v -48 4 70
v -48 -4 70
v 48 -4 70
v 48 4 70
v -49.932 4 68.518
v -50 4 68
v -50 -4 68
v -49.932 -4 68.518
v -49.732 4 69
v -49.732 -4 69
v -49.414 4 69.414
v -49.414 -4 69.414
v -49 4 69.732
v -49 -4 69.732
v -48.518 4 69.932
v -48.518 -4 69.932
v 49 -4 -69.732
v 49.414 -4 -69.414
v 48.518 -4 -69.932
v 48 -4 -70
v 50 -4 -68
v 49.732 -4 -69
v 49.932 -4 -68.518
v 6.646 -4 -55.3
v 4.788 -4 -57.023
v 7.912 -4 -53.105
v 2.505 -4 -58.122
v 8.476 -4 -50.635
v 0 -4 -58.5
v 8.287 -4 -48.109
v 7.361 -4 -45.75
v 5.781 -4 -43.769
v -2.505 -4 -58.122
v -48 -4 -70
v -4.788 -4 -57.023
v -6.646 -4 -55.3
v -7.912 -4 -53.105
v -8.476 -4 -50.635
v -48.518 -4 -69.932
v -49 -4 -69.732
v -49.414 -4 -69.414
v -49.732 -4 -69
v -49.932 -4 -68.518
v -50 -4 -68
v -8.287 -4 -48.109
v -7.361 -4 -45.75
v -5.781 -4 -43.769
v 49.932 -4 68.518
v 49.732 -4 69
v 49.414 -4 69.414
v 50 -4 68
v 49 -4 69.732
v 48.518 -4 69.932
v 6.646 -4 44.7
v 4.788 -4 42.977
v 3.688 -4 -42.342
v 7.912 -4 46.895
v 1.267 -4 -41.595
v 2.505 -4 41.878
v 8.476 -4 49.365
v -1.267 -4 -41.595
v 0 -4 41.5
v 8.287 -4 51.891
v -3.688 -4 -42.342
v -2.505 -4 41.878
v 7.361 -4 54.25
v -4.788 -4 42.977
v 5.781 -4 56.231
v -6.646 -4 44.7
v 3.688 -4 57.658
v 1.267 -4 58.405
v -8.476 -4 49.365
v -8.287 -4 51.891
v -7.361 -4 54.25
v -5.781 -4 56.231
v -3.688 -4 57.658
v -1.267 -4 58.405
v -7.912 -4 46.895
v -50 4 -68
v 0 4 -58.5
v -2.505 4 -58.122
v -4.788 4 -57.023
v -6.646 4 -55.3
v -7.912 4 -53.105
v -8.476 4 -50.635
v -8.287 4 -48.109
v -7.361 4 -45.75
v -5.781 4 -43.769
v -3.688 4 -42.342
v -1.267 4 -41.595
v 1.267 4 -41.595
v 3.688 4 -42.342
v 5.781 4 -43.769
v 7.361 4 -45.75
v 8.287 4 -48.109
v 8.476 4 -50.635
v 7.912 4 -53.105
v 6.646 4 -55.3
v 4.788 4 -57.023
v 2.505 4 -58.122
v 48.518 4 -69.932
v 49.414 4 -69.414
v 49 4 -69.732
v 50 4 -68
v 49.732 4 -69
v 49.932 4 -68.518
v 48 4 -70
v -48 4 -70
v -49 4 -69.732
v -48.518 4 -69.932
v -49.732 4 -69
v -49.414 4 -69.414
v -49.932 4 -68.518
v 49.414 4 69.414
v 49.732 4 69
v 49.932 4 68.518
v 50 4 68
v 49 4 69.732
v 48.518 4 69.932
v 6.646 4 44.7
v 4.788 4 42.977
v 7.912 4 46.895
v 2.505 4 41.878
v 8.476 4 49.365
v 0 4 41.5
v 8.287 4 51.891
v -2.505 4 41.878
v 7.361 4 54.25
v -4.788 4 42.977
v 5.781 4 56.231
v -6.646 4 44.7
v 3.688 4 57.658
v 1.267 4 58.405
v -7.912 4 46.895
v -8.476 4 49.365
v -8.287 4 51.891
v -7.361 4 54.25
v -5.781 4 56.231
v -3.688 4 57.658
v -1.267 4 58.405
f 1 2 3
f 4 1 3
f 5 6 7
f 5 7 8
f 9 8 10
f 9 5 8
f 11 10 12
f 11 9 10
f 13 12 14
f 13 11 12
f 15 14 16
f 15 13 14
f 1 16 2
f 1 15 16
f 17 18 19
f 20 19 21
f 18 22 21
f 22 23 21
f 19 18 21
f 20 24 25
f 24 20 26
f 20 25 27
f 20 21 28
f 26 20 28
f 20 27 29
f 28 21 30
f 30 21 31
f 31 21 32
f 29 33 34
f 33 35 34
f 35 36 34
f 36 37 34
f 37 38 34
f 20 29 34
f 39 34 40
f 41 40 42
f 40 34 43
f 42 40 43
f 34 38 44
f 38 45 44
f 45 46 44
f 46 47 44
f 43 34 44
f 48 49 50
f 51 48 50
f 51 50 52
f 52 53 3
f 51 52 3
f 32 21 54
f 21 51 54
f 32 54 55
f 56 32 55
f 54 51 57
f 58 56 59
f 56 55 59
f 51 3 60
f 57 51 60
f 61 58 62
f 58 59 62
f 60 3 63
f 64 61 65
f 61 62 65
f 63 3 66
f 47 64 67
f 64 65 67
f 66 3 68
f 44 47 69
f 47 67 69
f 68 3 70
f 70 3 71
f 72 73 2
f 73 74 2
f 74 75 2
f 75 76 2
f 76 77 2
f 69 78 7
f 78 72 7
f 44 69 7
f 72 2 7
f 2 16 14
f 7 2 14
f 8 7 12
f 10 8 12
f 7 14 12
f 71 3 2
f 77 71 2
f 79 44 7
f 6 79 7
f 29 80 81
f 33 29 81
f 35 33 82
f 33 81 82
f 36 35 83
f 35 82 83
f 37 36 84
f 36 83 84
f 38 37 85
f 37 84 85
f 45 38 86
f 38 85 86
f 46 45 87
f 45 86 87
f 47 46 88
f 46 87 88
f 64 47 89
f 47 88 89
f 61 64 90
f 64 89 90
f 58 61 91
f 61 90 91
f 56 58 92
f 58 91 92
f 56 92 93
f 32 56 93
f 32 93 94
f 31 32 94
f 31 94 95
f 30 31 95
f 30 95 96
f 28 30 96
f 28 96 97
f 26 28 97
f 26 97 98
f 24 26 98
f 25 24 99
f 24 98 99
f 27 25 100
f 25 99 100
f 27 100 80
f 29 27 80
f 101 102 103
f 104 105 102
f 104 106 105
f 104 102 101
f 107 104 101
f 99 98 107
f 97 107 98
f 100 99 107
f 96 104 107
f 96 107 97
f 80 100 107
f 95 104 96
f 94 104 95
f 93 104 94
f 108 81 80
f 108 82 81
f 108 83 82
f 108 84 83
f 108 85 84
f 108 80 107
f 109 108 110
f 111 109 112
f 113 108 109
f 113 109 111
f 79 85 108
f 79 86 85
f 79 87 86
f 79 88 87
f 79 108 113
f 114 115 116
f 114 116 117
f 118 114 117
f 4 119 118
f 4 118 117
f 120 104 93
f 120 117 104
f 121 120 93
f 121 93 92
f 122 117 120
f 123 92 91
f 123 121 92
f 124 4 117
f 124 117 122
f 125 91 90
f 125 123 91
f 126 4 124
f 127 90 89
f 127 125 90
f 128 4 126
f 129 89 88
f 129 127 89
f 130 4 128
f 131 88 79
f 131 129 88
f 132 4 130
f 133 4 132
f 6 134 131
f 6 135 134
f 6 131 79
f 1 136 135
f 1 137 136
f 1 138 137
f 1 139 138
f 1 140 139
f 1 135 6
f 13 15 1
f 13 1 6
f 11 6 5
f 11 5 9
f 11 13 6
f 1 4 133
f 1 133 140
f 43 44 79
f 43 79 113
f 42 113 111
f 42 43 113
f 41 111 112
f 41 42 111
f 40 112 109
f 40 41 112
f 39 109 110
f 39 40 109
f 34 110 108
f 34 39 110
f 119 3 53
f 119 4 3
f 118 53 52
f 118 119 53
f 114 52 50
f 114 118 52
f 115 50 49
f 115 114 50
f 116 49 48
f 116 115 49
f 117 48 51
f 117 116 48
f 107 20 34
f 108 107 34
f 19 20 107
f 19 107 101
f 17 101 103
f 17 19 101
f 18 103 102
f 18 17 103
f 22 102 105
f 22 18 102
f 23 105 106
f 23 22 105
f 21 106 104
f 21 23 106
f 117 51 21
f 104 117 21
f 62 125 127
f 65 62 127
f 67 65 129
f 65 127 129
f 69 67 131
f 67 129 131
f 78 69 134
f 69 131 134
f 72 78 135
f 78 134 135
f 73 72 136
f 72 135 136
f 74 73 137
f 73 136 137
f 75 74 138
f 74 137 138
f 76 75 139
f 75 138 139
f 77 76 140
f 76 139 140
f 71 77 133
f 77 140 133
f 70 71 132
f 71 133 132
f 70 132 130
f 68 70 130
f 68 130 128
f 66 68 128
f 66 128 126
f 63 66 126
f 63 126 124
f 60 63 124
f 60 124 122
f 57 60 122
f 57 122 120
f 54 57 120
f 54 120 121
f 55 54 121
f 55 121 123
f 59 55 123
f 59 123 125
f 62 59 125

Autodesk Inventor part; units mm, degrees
ref_plane "YZ Plane" through (0, 0, 0) normal (1, 0, 0) x (0, 1, 0)
ref_plane "XZ Plane" through (0, 0, 0) normal (0, 1, 0) x (-1, 0, 0)
ref_plane "XY Plane" through (0, 0, 0) normal (0, 0, 1) x (1, 0, 0)
sketch "Sketch1" plane through (0, 0, 0) normal (0, 1, 0) x (-1, 0, 0)
  line L0 (50, 70) -> (-50, 70)
  line L1 (-50, 70) -> (-50, -70)
  line L2 (-50, -70) -> (50, -70)
  line L3 (50, -70) -> (50, 70)
  point P0 (0, 0)
  point P1 (0, 70)
  point P2 (50, 0)
  dimension "d0" = 100
  dimension "d1" = 140
extrude "Plate1" add sketch "Sketch1" along normal mid plane 8
sketch "Sketch2" plane through (0, -4, 0) normal (0, -1, 0) x (1, 0, 0)
  line L0 (-50, -70) -> (-50, 70) projected
  line L1 (50, 70) -> (50, -70) projected
  line L2 (0, -50) -> (0, 50) construction
  point P0 (-50, 0)
  point P1 (0, 0)
  point P2 (0, 0)
  dimension "d17" = 100
hole "Hole1" at (0, -4, -50) at (0, -4, 50) direction (0, 1, 0) diameter 17 end through all
fillet "Fillet1" radius 2 4 edges at (50, 0, 70) (-50, 0, 70) (50, 0, -70) (-50, 0, -70)
equation "\"d8\" = Thickness"
equation "\"d2\" = Thickness"
equation "\"BendRadius\" = Thickness"
equation "\"BendReliefWidth\" = Thickness"
equation "\"BendReliefDepth\" = 0.5 * Thickness"
equation "\"CornerReliefSize\" = 4 * Thickness"
equation "\"MinimumRemnant\" = 2 * Thickness"
equation "\"TransitionRadius\" = BendRadius"
equation "\"JacobiRadiusSize\" = BendRadius"
equation "\"GapSize\" = Thickness"
equation "\"Thickness\" = 8"
properties part number "Сrane plate 5.1"
